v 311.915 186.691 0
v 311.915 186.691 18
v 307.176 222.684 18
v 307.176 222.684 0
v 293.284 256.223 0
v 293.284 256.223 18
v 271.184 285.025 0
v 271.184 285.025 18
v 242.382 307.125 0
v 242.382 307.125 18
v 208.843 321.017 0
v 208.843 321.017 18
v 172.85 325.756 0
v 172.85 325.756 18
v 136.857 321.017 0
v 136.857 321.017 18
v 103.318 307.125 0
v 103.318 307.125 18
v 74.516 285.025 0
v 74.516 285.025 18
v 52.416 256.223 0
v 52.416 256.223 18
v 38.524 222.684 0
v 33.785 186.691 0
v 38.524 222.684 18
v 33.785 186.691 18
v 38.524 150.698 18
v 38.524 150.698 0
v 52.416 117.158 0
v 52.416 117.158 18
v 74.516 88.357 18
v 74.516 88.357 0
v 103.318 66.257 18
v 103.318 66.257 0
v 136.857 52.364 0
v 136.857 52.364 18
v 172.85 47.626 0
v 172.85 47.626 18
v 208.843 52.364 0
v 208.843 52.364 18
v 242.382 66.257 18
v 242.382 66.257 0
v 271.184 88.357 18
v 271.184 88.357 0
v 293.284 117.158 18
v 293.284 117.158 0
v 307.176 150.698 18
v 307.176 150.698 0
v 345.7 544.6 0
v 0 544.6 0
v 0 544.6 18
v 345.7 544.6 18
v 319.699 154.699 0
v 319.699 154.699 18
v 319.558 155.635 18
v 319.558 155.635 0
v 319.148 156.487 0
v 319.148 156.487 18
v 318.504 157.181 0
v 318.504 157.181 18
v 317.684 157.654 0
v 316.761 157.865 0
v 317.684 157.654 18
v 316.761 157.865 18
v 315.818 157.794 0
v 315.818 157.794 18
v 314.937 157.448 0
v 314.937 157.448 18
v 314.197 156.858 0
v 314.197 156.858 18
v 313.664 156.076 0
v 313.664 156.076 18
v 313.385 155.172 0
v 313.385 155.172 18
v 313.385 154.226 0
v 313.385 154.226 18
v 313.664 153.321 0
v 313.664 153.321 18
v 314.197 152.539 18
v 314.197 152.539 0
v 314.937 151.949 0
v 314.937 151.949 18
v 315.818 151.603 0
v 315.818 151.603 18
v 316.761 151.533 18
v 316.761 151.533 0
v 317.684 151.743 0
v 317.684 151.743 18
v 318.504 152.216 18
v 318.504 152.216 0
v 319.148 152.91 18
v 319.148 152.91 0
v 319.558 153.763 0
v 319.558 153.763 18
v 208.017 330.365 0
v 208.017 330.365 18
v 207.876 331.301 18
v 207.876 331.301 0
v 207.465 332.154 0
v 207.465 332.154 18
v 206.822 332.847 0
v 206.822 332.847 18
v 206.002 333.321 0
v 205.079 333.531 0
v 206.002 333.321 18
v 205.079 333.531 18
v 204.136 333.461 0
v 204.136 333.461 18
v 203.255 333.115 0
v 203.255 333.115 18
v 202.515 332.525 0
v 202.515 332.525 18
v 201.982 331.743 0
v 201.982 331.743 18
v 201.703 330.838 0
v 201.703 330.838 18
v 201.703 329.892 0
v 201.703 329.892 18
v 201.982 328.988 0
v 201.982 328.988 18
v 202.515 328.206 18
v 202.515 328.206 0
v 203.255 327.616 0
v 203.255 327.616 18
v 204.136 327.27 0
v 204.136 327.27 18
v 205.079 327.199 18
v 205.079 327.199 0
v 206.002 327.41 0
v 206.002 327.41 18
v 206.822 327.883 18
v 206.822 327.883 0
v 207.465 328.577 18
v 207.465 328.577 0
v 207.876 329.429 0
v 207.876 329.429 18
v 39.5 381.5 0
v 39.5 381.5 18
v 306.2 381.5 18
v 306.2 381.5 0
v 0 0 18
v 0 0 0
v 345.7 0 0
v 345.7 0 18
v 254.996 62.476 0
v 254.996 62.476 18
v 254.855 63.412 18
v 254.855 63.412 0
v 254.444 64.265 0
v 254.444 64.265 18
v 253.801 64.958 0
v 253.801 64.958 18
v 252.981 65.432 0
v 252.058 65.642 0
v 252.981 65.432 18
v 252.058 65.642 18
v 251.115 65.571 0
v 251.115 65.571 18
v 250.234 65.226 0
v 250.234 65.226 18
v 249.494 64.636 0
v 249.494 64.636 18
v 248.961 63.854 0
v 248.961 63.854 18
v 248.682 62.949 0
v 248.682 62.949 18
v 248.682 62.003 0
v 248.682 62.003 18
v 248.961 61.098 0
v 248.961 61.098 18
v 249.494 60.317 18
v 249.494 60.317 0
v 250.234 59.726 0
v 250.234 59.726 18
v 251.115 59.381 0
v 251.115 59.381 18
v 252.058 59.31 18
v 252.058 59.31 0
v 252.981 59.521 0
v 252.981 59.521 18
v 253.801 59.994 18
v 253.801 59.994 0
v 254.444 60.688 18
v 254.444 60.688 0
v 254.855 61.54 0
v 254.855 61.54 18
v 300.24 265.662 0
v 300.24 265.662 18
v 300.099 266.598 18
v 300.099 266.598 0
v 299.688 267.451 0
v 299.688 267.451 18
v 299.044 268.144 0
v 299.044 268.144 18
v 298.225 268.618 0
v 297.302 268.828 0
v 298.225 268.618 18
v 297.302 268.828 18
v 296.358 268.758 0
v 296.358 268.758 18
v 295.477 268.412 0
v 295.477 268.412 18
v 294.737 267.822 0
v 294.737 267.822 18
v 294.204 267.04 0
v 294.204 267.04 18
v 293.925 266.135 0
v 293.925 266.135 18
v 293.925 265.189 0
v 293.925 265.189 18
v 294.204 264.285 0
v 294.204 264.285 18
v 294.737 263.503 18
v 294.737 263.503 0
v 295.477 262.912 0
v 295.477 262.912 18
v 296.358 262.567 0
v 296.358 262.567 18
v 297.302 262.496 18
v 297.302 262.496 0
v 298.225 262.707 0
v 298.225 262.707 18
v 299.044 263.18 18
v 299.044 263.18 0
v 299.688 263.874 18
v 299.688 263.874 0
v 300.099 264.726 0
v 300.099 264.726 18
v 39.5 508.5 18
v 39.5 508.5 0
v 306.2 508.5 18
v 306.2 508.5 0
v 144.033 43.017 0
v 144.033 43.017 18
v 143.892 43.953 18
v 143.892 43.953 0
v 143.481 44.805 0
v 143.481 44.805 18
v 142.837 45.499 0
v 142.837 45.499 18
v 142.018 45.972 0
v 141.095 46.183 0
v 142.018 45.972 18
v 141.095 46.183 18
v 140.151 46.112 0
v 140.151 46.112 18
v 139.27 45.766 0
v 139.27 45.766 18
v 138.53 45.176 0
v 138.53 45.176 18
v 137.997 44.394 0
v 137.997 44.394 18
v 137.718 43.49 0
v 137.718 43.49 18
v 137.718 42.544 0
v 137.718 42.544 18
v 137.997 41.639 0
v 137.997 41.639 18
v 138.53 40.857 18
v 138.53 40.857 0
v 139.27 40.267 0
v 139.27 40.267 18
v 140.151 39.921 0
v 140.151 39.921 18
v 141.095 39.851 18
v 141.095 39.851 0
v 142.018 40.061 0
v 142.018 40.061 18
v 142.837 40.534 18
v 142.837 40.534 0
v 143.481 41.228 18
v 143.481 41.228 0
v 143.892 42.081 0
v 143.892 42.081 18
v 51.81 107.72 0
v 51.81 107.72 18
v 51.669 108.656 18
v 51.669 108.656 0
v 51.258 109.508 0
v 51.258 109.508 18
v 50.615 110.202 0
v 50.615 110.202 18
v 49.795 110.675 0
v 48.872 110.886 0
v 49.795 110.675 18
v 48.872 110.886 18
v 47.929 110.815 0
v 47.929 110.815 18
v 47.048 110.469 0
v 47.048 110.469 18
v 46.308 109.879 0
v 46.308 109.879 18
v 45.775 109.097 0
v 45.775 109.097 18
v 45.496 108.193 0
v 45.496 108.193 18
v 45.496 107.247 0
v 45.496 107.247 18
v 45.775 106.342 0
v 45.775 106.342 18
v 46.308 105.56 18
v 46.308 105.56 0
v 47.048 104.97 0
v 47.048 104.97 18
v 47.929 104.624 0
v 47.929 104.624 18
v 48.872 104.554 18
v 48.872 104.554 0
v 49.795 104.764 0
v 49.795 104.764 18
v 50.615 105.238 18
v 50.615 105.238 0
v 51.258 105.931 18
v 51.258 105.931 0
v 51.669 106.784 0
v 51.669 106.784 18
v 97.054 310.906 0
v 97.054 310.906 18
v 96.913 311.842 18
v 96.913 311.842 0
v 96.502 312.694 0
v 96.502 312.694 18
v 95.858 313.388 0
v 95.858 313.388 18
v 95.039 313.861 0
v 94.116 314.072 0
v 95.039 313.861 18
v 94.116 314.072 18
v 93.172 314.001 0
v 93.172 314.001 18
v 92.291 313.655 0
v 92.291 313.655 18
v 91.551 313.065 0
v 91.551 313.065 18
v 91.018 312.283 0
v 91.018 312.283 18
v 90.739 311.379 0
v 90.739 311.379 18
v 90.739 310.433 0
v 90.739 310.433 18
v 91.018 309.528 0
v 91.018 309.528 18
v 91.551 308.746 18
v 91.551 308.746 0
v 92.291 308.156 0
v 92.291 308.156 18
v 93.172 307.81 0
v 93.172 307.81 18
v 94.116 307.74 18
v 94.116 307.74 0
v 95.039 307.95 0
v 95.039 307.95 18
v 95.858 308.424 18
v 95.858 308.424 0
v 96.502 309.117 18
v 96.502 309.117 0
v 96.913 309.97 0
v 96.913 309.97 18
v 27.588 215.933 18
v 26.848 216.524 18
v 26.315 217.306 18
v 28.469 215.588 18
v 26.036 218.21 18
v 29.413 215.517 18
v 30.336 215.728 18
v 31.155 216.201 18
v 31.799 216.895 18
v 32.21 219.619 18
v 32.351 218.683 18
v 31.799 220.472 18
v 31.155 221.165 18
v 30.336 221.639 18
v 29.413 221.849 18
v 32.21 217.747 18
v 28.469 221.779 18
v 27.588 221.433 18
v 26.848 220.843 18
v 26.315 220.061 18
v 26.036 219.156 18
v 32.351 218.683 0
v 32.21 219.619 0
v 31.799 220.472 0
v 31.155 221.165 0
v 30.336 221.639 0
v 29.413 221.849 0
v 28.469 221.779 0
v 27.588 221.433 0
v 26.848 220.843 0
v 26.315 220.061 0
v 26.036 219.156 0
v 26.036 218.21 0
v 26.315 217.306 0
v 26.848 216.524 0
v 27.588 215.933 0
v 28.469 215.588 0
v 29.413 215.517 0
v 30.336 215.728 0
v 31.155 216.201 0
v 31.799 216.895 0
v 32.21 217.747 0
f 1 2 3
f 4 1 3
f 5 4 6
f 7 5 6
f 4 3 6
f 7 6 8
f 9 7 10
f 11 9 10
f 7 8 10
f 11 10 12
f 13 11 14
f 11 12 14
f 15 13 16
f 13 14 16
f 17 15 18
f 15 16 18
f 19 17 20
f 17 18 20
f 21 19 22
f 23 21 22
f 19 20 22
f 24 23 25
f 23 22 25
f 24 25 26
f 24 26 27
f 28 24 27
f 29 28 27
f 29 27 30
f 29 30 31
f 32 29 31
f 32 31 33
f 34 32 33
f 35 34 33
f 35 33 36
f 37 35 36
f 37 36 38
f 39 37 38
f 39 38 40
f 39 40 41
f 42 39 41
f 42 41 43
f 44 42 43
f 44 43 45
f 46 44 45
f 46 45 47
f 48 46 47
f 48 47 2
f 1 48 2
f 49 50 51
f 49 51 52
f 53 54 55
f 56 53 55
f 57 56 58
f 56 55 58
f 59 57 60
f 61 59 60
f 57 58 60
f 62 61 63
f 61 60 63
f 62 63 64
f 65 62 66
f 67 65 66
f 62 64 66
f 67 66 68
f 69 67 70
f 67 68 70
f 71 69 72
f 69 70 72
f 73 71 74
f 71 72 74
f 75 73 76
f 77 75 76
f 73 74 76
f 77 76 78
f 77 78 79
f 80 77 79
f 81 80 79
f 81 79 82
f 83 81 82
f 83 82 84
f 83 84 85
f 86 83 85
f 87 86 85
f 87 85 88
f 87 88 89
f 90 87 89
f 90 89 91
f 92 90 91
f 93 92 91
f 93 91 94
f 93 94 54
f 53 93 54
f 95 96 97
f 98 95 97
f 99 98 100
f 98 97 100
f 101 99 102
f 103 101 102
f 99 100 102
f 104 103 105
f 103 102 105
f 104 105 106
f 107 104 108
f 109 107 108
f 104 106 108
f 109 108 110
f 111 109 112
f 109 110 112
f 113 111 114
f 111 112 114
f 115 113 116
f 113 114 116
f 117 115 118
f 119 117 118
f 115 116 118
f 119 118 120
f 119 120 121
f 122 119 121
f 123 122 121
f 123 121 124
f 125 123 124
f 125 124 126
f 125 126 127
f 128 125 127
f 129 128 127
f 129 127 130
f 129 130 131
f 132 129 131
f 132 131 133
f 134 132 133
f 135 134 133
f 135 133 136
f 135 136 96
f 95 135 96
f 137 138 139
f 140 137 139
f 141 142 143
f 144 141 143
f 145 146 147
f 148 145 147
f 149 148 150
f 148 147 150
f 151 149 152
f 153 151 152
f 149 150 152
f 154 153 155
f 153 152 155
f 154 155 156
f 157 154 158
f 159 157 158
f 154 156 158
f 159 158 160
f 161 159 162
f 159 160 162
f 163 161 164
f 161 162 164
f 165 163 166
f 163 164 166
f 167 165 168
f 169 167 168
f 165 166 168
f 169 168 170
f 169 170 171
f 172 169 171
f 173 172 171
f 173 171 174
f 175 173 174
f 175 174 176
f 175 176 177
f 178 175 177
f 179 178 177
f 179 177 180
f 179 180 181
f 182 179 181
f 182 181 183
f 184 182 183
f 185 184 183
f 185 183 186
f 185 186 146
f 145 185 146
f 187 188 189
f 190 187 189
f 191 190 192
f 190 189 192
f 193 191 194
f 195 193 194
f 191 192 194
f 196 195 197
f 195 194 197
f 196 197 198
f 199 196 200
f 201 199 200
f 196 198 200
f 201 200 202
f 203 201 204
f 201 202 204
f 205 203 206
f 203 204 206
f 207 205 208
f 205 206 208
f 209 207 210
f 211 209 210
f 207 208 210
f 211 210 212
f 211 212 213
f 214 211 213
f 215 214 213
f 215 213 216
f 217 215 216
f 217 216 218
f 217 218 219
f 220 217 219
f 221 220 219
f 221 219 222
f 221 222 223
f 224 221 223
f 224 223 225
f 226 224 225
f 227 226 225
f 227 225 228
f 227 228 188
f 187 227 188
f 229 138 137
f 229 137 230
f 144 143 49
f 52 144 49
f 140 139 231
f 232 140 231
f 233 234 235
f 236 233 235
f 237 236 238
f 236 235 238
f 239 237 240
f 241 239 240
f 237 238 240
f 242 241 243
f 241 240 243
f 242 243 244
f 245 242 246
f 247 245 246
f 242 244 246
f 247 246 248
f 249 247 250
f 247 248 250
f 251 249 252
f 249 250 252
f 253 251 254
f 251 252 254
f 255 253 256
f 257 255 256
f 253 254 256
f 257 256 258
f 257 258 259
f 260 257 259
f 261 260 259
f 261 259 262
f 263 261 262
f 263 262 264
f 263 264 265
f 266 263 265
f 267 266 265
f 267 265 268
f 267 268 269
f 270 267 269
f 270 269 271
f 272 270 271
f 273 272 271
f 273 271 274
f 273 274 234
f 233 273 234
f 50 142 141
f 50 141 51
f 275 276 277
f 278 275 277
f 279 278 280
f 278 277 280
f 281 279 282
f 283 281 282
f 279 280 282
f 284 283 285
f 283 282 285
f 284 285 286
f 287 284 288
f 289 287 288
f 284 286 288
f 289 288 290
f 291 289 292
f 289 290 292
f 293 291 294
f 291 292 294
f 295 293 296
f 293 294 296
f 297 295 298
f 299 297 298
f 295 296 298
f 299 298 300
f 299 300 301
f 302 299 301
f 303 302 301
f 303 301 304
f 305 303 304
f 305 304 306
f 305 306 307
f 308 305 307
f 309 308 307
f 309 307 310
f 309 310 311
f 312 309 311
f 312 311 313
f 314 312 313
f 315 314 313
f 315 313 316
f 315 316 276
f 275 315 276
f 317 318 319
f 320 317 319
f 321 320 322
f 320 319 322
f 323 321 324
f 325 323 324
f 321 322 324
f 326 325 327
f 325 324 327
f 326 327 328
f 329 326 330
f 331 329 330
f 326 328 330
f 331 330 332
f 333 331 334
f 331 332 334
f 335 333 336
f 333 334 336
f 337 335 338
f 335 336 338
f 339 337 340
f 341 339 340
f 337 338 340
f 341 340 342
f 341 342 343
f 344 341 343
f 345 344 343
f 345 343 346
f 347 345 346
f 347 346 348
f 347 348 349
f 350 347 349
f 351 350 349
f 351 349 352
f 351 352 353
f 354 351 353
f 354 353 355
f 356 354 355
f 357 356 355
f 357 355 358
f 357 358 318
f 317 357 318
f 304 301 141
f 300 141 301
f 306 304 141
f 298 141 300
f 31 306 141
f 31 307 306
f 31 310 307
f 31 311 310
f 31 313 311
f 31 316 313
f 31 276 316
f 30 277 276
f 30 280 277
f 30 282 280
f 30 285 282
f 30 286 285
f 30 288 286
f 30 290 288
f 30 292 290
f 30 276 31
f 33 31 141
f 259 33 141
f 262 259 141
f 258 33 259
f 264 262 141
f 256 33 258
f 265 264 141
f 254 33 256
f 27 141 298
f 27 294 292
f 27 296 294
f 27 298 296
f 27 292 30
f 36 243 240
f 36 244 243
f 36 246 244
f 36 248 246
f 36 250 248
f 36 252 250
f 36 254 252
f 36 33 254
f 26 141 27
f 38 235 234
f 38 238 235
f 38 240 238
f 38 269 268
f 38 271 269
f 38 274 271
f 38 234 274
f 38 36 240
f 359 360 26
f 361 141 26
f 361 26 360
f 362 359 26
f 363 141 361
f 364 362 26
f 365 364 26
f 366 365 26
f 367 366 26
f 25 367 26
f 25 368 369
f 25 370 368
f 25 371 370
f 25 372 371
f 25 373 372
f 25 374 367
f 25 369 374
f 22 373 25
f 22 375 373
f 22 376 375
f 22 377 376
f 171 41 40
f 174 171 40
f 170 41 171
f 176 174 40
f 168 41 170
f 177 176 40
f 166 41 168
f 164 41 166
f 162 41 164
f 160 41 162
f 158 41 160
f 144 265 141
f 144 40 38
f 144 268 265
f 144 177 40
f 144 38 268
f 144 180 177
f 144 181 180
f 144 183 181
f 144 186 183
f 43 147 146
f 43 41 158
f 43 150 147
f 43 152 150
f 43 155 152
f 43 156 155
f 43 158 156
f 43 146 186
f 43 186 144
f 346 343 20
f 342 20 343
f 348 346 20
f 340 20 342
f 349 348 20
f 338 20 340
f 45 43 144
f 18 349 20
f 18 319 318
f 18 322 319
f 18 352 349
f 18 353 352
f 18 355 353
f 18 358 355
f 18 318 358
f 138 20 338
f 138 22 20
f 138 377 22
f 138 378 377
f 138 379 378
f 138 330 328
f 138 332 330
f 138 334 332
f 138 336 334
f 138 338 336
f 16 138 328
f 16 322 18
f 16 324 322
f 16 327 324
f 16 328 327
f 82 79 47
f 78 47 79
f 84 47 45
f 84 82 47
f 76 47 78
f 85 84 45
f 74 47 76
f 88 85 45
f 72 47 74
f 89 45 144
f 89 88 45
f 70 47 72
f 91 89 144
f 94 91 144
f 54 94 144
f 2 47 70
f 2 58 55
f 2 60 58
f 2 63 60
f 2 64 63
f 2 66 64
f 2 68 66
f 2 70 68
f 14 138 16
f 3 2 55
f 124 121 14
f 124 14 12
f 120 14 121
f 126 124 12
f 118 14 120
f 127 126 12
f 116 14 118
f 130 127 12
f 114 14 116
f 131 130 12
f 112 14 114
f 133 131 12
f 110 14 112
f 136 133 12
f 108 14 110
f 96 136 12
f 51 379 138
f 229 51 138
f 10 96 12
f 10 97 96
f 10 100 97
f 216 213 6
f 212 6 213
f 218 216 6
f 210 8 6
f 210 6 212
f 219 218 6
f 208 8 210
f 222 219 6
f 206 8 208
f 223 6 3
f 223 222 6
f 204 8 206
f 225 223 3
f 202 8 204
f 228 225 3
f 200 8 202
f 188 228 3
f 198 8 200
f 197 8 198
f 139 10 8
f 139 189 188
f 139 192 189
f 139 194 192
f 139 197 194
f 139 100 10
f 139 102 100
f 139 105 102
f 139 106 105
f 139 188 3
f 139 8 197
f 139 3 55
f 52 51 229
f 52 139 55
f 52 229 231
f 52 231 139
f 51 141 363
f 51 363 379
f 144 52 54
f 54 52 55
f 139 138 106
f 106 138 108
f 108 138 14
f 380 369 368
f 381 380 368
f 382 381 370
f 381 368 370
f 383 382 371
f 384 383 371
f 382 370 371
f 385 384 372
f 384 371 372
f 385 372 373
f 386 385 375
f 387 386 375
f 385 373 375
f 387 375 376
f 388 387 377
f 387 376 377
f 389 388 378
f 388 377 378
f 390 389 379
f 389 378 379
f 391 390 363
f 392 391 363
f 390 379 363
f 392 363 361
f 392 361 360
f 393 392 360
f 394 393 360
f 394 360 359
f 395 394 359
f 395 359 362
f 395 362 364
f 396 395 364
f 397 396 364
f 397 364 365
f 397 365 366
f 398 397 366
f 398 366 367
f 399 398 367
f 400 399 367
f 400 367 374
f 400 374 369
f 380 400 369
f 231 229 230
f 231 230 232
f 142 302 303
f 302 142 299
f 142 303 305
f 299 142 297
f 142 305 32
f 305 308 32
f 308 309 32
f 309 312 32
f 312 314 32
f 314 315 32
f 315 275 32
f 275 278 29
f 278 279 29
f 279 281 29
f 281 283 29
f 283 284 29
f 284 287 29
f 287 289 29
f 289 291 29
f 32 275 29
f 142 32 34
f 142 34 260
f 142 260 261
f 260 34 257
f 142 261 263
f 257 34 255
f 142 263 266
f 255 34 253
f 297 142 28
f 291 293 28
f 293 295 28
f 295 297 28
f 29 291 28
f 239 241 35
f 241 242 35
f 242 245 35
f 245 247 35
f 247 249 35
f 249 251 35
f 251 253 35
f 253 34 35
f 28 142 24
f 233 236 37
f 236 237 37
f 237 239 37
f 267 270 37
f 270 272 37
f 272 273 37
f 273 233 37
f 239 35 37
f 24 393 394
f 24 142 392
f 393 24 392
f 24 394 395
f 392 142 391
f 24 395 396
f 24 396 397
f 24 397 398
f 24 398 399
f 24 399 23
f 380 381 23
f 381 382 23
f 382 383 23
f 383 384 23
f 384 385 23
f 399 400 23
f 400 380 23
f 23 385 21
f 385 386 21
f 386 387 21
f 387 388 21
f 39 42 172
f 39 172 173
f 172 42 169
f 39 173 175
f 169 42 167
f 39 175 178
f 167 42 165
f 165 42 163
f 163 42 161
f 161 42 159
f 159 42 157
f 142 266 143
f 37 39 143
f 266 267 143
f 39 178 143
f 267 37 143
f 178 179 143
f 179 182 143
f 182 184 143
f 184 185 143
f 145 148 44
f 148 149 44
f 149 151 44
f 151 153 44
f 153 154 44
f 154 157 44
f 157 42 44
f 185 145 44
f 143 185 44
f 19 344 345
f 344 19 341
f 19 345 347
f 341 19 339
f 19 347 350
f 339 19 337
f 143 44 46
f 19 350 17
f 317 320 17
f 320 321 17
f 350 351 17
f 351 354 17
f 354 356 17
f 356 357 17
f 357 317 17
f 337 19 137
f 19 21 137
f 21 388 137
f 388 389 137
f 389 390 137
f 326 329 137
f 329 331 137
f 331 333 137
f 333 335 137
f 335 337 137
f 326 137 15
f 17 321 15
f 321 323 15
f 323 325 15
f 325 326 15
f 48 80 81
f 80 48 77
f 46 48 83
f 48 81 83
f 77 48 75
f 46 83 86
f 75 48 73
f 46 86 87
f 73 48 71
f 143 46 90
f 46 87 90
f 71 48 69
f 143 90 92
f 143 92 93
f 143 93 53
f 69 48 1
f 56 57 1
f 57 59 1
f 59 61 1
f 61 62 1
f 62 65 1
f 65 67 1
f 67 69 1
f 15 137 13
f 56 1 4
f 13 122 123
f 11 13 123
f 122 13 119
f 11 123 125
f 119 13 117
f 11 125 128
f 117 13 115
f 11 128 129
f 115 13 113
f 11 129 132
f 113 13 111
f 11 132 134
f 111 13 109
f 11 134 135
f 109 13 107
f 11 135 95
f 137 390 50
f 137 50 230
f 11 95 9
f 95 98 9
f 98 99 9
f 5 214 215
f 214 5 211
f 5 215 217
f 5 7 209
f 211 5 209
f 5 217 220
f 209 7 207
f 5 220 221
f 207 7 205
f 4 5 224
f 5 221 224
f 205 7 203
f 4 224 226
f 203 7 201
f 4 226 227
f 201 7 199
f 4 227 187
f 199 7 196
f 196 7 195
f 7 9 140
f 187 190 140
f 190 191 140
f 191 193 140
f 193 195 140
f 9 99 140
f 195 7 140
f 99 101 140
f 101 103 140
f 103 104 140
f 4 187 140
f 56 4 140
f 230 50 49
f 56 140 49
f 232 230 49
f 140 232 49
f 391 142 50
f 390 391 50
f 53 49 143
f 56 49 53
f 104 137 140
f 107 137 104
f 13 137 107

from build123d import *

# Parameters (mm, degrees)
SKETCH1_W           = 345.7
SKETCH1_H           = 544.6
BOSS_EXTRUDE1_DEPTH = 18
SKETCH2_W           = 266.7
SKETCH2_H           = 127
CUT_EXTRUDE1_DEPTH  = 19
SKETCH3_R           = 139.065
CUT_EXTRUDE2_DEPTH  = 19
SKETCH4_R           = 3.175
CUT_EXTRUDE3_DEPTH  = 19


with BuildPart() as part:
    # Sketch1 → Boss-Extrude1 (new body)
    with BuildSketch(Plane.XY):
        with Locations((172.85, 272.3)):
            Rectangle(SKETCH1_W, SKETCH1_H)
    extrude(amount=BOSS_EXTRUDE1_DEPTH)

    # Sketch2 → Cut-Extrude1 (cut, through all)
    with BuildSketch(Plane.XY.offset(18)):
        with Locations((172.85, 445)):
            Rectangle(SKETCH2_W, SKETCH2_H)
    extrude(amount=-CUT_EXTRUDE1_DEPTH, mode=Mode.SUBTRACT)

    # Sketch3 → Cut-Extrude2 (cut, through all)
    with BuildSketch(Plane.XY.offset(18)):
        with Locations((172.85, 186.690965799)):
            Circle(SKETCH3_R)
    extrude(amount=-CUT_EXTRUDE2_DEPTH, mode=Mode.SUBTRACT)

    # Sketch4 → Cut-Extrude3 (cut, through all)
    with BuildSketch(Plane.XY.offset(18)):
        with Locations((204.842157428, 330.365184475)):
            Circle(SKETCH4_R)
        with Locations((297.06488577, 265.662108644)):
            Circle(SKETCH4_R)
        with Locations((316.524218676, 154.698808371)):
            Circle(SKETCH4_R)
        with Locations((251.821142845, 62.476080029)):
            Circle(SKETCH4_R)
        with Locations((140.857842572, 43.016747123)):
            Circle(SKETCH4_R)
        with Locations((48.63511423, 107.719822954)):
            Circle(SKETCH4_R)
        with Locations((29.175781324, 218.683123227)):
            Circle(SKETCH4_R)
        with Locations((93.878857155, 310.905851569)):
            Circle(SKETCH4_R)
    extrude(amount=-CUT_EXTRUDE3_DEPTH, mode=Mode.SUBTRACT)


solid = part.part
